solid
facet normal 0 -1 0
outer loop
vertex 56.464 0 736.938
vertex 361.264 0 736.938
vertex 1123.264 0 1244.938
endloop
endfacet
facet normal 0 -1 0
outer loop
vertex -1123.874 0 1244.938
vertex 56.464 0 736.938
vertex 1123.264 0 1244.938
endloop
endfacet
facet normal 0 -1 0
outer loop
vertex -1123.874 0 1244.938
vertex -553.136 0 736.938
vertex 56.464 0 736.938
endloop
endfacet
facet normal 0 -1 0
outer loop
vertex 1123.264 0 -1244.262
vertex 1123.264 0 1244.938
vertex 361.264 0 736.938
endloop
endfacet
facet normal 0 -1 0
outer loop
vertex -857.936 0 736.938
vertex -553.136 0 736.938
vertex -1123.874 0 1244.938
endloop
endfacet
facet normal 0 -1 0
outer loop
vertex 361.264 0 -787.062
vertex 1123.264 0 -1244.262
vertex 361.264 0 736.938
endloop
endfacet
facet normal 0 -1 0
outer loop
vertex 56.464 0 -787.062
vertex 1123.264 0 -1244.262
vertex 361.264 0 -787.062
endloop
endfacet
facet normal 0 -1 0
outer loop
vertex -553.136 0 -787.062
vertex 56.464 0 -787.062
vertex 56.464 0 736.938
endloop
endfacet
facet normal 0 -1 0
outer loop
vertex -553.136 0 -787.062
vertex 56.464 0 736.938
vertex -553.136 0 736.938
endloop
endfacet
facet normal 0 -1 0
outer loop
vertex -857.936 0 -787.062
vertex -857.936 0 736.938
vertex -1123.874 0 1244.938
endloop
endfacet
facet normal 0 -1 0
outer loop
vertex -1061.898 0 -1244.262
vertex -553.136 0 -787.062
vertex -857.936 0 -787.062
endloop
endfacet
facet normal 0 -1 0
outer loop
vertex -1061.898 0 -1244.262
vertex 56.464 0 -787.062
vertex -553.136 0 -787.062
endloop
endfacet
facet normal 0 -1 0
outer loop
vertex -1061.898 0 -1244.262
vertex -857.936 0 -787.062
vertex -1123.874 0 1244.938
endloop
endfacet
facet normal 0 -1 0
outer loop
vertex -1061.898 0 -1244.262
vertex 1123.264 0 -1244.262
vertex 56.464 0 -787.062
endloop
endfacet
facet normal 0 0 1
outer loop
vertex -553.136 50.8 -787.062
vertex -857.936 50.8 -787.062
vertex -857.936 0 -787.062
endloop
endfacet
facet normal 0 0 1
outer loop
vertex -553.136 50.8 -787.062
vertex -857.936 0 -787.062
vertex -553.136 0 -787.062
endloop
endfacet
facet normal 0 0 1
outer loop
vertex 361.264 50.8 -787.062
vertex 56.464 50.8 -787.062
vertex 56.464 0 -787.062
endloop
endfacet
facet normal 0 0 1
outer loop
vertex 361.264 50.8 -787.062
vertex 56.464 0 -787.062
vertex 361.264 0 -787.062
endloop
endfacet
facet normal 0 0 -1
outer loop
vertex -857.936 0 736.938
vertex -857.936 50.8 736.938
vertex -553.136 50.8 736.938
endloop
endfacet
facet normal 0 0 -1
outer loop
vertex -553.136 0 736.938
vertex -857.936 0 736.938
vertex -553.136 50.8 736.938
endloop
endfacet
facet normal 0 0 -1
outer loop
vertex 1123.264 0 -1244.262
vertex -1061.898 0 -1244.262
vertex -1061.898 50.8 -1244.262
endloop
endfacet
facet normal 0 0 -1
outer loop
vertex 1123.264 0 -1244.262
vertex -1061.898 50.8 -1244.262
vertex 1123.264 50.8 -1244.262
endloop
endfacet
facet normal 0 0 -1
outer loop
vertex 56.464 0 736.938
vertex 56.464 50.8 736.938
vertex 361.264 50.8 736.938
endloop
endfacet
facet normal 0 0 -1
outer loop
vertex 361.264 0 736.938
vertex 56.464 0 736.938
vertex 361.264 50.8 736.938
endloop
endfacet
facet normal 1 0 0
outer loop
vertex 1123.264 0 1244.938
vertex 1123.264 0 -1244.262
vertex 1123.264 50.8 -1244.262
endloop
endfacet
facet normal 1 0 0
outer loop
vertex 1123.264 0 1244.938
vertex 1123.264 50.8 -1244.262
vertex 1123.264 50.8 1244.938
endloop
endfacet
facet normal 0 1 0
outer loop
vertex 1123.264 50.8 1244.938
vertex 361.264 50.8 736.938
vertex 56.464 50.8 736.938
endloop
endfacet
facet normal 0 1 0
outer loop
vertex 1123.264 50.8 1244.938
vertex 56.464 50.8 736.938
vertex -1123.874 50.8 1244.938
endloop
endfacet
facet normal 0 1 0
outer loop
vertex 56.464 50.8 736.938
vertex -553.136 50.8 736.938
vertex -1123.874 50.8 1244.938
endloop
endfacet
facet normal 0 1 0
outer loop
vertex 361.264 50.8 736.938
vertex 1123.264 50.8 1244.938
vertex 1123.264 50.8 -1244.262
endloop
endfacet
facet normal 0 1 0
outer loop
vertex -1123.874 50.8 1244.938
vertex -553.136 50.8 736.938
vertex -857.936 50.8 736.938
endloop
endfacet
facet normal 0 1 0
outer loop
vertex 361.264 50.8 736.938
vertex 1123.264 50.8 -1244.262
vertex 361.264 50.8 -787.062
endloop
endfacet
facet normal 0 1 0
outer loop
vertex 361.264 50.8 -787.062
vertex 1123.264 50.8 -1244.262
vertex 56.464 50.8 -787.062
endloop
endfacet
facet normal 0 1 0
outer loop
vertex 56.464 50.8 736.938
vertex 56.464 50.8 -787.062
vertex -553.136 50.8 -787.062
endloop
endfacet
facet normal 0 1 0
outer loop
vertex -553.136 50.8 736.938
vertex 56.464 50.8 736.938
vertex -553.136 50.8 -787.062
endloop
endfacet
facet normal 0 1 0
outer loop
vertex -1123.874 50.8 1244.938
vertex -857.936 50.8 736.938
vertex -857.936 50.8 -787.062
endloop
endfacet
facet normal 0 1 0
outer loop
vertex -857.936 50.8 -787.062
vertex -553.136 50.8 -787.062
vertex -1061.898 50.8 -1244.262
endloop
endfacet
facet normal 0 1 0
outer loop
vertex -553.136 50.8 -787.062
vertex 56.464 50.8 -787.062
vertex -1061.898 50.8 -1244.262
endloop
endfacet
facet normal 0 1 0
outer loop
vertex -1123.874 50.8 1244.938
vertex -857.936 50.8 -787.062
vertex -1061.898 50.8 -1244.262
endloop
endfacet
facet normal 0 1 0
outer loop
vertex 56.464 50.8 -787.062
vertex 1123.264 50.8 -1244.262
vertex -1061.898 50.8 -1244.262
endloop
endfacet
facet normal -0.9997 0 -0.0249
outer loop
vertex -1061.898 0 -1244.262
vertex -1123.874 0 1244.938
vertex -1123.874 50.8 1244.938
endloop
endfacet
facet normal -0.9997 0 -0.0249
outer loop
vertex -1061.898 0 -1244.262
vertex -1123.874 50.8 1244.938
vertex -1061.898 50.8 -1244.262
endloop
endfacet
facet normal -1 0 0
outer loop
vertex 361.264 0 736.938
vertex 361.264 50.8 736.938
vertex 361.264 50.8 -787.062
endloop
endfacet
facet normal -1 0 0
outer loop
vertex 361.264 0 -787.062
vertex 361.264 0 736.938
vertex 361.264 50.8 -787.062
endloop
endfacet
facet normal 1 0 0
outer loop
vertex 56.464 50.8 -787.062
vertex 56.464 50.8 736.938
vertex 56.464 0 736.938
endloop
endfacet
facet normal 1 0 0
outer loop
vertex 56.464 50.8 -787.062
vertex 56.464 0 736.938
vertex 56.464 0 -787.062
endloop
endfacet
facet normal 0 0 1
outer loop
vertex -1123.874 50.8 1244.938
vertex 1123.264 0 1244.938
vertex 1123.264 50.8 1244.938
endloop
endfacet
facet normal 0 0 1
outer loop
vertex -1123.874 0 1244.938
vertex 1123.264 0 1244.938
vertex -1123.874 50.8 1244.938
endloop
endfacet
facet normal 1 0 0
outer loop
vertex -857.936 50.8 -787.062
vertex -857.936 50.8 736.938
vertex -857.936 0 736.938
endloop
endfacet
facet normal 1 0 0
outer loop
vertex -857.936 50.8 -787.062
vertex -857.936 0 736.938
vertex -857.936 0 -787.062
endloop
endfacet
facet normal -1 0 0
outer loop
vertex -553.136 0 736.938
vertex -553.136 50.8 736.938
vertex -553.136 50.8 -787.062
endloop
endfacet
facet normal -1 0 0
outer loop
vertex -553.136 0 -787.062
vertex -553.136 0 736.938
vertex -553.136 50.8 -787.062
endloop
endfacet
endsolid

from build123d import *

# Parameters (mm, degrees)
BOSS_EXTRUDE1_DEPTH = 50.8
SKETCH2_W           = 304.8
SKETCH2_H           = 1524
CUT_EXTRUDE1_DEPTH  = 50.8


with BuildPart() as part:
    # Sketch1 → Boss-Extrude1 (new body)
    with BuildSketch(Plane(origin=(0, 0, 0), x_dir=(1, 0, 0), z_dir=(0, 1, 0))):
        Polygon((-1123.874350932, -1244.938243374), (-1061.898350932, 1244.261756626), (1123.263649068, 1244.261756626), (1123.263649068, -1244.938243374), align=None)
    extrude(amount=BOSS_EXTRUDE1_DEPTH)

    # Sketch2 → Cut-Extrude1 (cut)
    with BuildSketch(Plane(origin=(0, 50.8, 0), x_dir=(1, 0, 0), z_dir=(0, 1, 0))):
        with Locations((208.863649068, 25.061756626)):
            Rectangle(SKETCH2_W, SKETCH2_H)
        with Locations((-705.536350932, 25.061756626)):
            Rectangle(SKETCH2_W, SKETCH2_H)
    extrude(amount=-CUT_EXTRUDE1_DEPTH, mode=Mode.SUBTRACT)


solid = part.part
